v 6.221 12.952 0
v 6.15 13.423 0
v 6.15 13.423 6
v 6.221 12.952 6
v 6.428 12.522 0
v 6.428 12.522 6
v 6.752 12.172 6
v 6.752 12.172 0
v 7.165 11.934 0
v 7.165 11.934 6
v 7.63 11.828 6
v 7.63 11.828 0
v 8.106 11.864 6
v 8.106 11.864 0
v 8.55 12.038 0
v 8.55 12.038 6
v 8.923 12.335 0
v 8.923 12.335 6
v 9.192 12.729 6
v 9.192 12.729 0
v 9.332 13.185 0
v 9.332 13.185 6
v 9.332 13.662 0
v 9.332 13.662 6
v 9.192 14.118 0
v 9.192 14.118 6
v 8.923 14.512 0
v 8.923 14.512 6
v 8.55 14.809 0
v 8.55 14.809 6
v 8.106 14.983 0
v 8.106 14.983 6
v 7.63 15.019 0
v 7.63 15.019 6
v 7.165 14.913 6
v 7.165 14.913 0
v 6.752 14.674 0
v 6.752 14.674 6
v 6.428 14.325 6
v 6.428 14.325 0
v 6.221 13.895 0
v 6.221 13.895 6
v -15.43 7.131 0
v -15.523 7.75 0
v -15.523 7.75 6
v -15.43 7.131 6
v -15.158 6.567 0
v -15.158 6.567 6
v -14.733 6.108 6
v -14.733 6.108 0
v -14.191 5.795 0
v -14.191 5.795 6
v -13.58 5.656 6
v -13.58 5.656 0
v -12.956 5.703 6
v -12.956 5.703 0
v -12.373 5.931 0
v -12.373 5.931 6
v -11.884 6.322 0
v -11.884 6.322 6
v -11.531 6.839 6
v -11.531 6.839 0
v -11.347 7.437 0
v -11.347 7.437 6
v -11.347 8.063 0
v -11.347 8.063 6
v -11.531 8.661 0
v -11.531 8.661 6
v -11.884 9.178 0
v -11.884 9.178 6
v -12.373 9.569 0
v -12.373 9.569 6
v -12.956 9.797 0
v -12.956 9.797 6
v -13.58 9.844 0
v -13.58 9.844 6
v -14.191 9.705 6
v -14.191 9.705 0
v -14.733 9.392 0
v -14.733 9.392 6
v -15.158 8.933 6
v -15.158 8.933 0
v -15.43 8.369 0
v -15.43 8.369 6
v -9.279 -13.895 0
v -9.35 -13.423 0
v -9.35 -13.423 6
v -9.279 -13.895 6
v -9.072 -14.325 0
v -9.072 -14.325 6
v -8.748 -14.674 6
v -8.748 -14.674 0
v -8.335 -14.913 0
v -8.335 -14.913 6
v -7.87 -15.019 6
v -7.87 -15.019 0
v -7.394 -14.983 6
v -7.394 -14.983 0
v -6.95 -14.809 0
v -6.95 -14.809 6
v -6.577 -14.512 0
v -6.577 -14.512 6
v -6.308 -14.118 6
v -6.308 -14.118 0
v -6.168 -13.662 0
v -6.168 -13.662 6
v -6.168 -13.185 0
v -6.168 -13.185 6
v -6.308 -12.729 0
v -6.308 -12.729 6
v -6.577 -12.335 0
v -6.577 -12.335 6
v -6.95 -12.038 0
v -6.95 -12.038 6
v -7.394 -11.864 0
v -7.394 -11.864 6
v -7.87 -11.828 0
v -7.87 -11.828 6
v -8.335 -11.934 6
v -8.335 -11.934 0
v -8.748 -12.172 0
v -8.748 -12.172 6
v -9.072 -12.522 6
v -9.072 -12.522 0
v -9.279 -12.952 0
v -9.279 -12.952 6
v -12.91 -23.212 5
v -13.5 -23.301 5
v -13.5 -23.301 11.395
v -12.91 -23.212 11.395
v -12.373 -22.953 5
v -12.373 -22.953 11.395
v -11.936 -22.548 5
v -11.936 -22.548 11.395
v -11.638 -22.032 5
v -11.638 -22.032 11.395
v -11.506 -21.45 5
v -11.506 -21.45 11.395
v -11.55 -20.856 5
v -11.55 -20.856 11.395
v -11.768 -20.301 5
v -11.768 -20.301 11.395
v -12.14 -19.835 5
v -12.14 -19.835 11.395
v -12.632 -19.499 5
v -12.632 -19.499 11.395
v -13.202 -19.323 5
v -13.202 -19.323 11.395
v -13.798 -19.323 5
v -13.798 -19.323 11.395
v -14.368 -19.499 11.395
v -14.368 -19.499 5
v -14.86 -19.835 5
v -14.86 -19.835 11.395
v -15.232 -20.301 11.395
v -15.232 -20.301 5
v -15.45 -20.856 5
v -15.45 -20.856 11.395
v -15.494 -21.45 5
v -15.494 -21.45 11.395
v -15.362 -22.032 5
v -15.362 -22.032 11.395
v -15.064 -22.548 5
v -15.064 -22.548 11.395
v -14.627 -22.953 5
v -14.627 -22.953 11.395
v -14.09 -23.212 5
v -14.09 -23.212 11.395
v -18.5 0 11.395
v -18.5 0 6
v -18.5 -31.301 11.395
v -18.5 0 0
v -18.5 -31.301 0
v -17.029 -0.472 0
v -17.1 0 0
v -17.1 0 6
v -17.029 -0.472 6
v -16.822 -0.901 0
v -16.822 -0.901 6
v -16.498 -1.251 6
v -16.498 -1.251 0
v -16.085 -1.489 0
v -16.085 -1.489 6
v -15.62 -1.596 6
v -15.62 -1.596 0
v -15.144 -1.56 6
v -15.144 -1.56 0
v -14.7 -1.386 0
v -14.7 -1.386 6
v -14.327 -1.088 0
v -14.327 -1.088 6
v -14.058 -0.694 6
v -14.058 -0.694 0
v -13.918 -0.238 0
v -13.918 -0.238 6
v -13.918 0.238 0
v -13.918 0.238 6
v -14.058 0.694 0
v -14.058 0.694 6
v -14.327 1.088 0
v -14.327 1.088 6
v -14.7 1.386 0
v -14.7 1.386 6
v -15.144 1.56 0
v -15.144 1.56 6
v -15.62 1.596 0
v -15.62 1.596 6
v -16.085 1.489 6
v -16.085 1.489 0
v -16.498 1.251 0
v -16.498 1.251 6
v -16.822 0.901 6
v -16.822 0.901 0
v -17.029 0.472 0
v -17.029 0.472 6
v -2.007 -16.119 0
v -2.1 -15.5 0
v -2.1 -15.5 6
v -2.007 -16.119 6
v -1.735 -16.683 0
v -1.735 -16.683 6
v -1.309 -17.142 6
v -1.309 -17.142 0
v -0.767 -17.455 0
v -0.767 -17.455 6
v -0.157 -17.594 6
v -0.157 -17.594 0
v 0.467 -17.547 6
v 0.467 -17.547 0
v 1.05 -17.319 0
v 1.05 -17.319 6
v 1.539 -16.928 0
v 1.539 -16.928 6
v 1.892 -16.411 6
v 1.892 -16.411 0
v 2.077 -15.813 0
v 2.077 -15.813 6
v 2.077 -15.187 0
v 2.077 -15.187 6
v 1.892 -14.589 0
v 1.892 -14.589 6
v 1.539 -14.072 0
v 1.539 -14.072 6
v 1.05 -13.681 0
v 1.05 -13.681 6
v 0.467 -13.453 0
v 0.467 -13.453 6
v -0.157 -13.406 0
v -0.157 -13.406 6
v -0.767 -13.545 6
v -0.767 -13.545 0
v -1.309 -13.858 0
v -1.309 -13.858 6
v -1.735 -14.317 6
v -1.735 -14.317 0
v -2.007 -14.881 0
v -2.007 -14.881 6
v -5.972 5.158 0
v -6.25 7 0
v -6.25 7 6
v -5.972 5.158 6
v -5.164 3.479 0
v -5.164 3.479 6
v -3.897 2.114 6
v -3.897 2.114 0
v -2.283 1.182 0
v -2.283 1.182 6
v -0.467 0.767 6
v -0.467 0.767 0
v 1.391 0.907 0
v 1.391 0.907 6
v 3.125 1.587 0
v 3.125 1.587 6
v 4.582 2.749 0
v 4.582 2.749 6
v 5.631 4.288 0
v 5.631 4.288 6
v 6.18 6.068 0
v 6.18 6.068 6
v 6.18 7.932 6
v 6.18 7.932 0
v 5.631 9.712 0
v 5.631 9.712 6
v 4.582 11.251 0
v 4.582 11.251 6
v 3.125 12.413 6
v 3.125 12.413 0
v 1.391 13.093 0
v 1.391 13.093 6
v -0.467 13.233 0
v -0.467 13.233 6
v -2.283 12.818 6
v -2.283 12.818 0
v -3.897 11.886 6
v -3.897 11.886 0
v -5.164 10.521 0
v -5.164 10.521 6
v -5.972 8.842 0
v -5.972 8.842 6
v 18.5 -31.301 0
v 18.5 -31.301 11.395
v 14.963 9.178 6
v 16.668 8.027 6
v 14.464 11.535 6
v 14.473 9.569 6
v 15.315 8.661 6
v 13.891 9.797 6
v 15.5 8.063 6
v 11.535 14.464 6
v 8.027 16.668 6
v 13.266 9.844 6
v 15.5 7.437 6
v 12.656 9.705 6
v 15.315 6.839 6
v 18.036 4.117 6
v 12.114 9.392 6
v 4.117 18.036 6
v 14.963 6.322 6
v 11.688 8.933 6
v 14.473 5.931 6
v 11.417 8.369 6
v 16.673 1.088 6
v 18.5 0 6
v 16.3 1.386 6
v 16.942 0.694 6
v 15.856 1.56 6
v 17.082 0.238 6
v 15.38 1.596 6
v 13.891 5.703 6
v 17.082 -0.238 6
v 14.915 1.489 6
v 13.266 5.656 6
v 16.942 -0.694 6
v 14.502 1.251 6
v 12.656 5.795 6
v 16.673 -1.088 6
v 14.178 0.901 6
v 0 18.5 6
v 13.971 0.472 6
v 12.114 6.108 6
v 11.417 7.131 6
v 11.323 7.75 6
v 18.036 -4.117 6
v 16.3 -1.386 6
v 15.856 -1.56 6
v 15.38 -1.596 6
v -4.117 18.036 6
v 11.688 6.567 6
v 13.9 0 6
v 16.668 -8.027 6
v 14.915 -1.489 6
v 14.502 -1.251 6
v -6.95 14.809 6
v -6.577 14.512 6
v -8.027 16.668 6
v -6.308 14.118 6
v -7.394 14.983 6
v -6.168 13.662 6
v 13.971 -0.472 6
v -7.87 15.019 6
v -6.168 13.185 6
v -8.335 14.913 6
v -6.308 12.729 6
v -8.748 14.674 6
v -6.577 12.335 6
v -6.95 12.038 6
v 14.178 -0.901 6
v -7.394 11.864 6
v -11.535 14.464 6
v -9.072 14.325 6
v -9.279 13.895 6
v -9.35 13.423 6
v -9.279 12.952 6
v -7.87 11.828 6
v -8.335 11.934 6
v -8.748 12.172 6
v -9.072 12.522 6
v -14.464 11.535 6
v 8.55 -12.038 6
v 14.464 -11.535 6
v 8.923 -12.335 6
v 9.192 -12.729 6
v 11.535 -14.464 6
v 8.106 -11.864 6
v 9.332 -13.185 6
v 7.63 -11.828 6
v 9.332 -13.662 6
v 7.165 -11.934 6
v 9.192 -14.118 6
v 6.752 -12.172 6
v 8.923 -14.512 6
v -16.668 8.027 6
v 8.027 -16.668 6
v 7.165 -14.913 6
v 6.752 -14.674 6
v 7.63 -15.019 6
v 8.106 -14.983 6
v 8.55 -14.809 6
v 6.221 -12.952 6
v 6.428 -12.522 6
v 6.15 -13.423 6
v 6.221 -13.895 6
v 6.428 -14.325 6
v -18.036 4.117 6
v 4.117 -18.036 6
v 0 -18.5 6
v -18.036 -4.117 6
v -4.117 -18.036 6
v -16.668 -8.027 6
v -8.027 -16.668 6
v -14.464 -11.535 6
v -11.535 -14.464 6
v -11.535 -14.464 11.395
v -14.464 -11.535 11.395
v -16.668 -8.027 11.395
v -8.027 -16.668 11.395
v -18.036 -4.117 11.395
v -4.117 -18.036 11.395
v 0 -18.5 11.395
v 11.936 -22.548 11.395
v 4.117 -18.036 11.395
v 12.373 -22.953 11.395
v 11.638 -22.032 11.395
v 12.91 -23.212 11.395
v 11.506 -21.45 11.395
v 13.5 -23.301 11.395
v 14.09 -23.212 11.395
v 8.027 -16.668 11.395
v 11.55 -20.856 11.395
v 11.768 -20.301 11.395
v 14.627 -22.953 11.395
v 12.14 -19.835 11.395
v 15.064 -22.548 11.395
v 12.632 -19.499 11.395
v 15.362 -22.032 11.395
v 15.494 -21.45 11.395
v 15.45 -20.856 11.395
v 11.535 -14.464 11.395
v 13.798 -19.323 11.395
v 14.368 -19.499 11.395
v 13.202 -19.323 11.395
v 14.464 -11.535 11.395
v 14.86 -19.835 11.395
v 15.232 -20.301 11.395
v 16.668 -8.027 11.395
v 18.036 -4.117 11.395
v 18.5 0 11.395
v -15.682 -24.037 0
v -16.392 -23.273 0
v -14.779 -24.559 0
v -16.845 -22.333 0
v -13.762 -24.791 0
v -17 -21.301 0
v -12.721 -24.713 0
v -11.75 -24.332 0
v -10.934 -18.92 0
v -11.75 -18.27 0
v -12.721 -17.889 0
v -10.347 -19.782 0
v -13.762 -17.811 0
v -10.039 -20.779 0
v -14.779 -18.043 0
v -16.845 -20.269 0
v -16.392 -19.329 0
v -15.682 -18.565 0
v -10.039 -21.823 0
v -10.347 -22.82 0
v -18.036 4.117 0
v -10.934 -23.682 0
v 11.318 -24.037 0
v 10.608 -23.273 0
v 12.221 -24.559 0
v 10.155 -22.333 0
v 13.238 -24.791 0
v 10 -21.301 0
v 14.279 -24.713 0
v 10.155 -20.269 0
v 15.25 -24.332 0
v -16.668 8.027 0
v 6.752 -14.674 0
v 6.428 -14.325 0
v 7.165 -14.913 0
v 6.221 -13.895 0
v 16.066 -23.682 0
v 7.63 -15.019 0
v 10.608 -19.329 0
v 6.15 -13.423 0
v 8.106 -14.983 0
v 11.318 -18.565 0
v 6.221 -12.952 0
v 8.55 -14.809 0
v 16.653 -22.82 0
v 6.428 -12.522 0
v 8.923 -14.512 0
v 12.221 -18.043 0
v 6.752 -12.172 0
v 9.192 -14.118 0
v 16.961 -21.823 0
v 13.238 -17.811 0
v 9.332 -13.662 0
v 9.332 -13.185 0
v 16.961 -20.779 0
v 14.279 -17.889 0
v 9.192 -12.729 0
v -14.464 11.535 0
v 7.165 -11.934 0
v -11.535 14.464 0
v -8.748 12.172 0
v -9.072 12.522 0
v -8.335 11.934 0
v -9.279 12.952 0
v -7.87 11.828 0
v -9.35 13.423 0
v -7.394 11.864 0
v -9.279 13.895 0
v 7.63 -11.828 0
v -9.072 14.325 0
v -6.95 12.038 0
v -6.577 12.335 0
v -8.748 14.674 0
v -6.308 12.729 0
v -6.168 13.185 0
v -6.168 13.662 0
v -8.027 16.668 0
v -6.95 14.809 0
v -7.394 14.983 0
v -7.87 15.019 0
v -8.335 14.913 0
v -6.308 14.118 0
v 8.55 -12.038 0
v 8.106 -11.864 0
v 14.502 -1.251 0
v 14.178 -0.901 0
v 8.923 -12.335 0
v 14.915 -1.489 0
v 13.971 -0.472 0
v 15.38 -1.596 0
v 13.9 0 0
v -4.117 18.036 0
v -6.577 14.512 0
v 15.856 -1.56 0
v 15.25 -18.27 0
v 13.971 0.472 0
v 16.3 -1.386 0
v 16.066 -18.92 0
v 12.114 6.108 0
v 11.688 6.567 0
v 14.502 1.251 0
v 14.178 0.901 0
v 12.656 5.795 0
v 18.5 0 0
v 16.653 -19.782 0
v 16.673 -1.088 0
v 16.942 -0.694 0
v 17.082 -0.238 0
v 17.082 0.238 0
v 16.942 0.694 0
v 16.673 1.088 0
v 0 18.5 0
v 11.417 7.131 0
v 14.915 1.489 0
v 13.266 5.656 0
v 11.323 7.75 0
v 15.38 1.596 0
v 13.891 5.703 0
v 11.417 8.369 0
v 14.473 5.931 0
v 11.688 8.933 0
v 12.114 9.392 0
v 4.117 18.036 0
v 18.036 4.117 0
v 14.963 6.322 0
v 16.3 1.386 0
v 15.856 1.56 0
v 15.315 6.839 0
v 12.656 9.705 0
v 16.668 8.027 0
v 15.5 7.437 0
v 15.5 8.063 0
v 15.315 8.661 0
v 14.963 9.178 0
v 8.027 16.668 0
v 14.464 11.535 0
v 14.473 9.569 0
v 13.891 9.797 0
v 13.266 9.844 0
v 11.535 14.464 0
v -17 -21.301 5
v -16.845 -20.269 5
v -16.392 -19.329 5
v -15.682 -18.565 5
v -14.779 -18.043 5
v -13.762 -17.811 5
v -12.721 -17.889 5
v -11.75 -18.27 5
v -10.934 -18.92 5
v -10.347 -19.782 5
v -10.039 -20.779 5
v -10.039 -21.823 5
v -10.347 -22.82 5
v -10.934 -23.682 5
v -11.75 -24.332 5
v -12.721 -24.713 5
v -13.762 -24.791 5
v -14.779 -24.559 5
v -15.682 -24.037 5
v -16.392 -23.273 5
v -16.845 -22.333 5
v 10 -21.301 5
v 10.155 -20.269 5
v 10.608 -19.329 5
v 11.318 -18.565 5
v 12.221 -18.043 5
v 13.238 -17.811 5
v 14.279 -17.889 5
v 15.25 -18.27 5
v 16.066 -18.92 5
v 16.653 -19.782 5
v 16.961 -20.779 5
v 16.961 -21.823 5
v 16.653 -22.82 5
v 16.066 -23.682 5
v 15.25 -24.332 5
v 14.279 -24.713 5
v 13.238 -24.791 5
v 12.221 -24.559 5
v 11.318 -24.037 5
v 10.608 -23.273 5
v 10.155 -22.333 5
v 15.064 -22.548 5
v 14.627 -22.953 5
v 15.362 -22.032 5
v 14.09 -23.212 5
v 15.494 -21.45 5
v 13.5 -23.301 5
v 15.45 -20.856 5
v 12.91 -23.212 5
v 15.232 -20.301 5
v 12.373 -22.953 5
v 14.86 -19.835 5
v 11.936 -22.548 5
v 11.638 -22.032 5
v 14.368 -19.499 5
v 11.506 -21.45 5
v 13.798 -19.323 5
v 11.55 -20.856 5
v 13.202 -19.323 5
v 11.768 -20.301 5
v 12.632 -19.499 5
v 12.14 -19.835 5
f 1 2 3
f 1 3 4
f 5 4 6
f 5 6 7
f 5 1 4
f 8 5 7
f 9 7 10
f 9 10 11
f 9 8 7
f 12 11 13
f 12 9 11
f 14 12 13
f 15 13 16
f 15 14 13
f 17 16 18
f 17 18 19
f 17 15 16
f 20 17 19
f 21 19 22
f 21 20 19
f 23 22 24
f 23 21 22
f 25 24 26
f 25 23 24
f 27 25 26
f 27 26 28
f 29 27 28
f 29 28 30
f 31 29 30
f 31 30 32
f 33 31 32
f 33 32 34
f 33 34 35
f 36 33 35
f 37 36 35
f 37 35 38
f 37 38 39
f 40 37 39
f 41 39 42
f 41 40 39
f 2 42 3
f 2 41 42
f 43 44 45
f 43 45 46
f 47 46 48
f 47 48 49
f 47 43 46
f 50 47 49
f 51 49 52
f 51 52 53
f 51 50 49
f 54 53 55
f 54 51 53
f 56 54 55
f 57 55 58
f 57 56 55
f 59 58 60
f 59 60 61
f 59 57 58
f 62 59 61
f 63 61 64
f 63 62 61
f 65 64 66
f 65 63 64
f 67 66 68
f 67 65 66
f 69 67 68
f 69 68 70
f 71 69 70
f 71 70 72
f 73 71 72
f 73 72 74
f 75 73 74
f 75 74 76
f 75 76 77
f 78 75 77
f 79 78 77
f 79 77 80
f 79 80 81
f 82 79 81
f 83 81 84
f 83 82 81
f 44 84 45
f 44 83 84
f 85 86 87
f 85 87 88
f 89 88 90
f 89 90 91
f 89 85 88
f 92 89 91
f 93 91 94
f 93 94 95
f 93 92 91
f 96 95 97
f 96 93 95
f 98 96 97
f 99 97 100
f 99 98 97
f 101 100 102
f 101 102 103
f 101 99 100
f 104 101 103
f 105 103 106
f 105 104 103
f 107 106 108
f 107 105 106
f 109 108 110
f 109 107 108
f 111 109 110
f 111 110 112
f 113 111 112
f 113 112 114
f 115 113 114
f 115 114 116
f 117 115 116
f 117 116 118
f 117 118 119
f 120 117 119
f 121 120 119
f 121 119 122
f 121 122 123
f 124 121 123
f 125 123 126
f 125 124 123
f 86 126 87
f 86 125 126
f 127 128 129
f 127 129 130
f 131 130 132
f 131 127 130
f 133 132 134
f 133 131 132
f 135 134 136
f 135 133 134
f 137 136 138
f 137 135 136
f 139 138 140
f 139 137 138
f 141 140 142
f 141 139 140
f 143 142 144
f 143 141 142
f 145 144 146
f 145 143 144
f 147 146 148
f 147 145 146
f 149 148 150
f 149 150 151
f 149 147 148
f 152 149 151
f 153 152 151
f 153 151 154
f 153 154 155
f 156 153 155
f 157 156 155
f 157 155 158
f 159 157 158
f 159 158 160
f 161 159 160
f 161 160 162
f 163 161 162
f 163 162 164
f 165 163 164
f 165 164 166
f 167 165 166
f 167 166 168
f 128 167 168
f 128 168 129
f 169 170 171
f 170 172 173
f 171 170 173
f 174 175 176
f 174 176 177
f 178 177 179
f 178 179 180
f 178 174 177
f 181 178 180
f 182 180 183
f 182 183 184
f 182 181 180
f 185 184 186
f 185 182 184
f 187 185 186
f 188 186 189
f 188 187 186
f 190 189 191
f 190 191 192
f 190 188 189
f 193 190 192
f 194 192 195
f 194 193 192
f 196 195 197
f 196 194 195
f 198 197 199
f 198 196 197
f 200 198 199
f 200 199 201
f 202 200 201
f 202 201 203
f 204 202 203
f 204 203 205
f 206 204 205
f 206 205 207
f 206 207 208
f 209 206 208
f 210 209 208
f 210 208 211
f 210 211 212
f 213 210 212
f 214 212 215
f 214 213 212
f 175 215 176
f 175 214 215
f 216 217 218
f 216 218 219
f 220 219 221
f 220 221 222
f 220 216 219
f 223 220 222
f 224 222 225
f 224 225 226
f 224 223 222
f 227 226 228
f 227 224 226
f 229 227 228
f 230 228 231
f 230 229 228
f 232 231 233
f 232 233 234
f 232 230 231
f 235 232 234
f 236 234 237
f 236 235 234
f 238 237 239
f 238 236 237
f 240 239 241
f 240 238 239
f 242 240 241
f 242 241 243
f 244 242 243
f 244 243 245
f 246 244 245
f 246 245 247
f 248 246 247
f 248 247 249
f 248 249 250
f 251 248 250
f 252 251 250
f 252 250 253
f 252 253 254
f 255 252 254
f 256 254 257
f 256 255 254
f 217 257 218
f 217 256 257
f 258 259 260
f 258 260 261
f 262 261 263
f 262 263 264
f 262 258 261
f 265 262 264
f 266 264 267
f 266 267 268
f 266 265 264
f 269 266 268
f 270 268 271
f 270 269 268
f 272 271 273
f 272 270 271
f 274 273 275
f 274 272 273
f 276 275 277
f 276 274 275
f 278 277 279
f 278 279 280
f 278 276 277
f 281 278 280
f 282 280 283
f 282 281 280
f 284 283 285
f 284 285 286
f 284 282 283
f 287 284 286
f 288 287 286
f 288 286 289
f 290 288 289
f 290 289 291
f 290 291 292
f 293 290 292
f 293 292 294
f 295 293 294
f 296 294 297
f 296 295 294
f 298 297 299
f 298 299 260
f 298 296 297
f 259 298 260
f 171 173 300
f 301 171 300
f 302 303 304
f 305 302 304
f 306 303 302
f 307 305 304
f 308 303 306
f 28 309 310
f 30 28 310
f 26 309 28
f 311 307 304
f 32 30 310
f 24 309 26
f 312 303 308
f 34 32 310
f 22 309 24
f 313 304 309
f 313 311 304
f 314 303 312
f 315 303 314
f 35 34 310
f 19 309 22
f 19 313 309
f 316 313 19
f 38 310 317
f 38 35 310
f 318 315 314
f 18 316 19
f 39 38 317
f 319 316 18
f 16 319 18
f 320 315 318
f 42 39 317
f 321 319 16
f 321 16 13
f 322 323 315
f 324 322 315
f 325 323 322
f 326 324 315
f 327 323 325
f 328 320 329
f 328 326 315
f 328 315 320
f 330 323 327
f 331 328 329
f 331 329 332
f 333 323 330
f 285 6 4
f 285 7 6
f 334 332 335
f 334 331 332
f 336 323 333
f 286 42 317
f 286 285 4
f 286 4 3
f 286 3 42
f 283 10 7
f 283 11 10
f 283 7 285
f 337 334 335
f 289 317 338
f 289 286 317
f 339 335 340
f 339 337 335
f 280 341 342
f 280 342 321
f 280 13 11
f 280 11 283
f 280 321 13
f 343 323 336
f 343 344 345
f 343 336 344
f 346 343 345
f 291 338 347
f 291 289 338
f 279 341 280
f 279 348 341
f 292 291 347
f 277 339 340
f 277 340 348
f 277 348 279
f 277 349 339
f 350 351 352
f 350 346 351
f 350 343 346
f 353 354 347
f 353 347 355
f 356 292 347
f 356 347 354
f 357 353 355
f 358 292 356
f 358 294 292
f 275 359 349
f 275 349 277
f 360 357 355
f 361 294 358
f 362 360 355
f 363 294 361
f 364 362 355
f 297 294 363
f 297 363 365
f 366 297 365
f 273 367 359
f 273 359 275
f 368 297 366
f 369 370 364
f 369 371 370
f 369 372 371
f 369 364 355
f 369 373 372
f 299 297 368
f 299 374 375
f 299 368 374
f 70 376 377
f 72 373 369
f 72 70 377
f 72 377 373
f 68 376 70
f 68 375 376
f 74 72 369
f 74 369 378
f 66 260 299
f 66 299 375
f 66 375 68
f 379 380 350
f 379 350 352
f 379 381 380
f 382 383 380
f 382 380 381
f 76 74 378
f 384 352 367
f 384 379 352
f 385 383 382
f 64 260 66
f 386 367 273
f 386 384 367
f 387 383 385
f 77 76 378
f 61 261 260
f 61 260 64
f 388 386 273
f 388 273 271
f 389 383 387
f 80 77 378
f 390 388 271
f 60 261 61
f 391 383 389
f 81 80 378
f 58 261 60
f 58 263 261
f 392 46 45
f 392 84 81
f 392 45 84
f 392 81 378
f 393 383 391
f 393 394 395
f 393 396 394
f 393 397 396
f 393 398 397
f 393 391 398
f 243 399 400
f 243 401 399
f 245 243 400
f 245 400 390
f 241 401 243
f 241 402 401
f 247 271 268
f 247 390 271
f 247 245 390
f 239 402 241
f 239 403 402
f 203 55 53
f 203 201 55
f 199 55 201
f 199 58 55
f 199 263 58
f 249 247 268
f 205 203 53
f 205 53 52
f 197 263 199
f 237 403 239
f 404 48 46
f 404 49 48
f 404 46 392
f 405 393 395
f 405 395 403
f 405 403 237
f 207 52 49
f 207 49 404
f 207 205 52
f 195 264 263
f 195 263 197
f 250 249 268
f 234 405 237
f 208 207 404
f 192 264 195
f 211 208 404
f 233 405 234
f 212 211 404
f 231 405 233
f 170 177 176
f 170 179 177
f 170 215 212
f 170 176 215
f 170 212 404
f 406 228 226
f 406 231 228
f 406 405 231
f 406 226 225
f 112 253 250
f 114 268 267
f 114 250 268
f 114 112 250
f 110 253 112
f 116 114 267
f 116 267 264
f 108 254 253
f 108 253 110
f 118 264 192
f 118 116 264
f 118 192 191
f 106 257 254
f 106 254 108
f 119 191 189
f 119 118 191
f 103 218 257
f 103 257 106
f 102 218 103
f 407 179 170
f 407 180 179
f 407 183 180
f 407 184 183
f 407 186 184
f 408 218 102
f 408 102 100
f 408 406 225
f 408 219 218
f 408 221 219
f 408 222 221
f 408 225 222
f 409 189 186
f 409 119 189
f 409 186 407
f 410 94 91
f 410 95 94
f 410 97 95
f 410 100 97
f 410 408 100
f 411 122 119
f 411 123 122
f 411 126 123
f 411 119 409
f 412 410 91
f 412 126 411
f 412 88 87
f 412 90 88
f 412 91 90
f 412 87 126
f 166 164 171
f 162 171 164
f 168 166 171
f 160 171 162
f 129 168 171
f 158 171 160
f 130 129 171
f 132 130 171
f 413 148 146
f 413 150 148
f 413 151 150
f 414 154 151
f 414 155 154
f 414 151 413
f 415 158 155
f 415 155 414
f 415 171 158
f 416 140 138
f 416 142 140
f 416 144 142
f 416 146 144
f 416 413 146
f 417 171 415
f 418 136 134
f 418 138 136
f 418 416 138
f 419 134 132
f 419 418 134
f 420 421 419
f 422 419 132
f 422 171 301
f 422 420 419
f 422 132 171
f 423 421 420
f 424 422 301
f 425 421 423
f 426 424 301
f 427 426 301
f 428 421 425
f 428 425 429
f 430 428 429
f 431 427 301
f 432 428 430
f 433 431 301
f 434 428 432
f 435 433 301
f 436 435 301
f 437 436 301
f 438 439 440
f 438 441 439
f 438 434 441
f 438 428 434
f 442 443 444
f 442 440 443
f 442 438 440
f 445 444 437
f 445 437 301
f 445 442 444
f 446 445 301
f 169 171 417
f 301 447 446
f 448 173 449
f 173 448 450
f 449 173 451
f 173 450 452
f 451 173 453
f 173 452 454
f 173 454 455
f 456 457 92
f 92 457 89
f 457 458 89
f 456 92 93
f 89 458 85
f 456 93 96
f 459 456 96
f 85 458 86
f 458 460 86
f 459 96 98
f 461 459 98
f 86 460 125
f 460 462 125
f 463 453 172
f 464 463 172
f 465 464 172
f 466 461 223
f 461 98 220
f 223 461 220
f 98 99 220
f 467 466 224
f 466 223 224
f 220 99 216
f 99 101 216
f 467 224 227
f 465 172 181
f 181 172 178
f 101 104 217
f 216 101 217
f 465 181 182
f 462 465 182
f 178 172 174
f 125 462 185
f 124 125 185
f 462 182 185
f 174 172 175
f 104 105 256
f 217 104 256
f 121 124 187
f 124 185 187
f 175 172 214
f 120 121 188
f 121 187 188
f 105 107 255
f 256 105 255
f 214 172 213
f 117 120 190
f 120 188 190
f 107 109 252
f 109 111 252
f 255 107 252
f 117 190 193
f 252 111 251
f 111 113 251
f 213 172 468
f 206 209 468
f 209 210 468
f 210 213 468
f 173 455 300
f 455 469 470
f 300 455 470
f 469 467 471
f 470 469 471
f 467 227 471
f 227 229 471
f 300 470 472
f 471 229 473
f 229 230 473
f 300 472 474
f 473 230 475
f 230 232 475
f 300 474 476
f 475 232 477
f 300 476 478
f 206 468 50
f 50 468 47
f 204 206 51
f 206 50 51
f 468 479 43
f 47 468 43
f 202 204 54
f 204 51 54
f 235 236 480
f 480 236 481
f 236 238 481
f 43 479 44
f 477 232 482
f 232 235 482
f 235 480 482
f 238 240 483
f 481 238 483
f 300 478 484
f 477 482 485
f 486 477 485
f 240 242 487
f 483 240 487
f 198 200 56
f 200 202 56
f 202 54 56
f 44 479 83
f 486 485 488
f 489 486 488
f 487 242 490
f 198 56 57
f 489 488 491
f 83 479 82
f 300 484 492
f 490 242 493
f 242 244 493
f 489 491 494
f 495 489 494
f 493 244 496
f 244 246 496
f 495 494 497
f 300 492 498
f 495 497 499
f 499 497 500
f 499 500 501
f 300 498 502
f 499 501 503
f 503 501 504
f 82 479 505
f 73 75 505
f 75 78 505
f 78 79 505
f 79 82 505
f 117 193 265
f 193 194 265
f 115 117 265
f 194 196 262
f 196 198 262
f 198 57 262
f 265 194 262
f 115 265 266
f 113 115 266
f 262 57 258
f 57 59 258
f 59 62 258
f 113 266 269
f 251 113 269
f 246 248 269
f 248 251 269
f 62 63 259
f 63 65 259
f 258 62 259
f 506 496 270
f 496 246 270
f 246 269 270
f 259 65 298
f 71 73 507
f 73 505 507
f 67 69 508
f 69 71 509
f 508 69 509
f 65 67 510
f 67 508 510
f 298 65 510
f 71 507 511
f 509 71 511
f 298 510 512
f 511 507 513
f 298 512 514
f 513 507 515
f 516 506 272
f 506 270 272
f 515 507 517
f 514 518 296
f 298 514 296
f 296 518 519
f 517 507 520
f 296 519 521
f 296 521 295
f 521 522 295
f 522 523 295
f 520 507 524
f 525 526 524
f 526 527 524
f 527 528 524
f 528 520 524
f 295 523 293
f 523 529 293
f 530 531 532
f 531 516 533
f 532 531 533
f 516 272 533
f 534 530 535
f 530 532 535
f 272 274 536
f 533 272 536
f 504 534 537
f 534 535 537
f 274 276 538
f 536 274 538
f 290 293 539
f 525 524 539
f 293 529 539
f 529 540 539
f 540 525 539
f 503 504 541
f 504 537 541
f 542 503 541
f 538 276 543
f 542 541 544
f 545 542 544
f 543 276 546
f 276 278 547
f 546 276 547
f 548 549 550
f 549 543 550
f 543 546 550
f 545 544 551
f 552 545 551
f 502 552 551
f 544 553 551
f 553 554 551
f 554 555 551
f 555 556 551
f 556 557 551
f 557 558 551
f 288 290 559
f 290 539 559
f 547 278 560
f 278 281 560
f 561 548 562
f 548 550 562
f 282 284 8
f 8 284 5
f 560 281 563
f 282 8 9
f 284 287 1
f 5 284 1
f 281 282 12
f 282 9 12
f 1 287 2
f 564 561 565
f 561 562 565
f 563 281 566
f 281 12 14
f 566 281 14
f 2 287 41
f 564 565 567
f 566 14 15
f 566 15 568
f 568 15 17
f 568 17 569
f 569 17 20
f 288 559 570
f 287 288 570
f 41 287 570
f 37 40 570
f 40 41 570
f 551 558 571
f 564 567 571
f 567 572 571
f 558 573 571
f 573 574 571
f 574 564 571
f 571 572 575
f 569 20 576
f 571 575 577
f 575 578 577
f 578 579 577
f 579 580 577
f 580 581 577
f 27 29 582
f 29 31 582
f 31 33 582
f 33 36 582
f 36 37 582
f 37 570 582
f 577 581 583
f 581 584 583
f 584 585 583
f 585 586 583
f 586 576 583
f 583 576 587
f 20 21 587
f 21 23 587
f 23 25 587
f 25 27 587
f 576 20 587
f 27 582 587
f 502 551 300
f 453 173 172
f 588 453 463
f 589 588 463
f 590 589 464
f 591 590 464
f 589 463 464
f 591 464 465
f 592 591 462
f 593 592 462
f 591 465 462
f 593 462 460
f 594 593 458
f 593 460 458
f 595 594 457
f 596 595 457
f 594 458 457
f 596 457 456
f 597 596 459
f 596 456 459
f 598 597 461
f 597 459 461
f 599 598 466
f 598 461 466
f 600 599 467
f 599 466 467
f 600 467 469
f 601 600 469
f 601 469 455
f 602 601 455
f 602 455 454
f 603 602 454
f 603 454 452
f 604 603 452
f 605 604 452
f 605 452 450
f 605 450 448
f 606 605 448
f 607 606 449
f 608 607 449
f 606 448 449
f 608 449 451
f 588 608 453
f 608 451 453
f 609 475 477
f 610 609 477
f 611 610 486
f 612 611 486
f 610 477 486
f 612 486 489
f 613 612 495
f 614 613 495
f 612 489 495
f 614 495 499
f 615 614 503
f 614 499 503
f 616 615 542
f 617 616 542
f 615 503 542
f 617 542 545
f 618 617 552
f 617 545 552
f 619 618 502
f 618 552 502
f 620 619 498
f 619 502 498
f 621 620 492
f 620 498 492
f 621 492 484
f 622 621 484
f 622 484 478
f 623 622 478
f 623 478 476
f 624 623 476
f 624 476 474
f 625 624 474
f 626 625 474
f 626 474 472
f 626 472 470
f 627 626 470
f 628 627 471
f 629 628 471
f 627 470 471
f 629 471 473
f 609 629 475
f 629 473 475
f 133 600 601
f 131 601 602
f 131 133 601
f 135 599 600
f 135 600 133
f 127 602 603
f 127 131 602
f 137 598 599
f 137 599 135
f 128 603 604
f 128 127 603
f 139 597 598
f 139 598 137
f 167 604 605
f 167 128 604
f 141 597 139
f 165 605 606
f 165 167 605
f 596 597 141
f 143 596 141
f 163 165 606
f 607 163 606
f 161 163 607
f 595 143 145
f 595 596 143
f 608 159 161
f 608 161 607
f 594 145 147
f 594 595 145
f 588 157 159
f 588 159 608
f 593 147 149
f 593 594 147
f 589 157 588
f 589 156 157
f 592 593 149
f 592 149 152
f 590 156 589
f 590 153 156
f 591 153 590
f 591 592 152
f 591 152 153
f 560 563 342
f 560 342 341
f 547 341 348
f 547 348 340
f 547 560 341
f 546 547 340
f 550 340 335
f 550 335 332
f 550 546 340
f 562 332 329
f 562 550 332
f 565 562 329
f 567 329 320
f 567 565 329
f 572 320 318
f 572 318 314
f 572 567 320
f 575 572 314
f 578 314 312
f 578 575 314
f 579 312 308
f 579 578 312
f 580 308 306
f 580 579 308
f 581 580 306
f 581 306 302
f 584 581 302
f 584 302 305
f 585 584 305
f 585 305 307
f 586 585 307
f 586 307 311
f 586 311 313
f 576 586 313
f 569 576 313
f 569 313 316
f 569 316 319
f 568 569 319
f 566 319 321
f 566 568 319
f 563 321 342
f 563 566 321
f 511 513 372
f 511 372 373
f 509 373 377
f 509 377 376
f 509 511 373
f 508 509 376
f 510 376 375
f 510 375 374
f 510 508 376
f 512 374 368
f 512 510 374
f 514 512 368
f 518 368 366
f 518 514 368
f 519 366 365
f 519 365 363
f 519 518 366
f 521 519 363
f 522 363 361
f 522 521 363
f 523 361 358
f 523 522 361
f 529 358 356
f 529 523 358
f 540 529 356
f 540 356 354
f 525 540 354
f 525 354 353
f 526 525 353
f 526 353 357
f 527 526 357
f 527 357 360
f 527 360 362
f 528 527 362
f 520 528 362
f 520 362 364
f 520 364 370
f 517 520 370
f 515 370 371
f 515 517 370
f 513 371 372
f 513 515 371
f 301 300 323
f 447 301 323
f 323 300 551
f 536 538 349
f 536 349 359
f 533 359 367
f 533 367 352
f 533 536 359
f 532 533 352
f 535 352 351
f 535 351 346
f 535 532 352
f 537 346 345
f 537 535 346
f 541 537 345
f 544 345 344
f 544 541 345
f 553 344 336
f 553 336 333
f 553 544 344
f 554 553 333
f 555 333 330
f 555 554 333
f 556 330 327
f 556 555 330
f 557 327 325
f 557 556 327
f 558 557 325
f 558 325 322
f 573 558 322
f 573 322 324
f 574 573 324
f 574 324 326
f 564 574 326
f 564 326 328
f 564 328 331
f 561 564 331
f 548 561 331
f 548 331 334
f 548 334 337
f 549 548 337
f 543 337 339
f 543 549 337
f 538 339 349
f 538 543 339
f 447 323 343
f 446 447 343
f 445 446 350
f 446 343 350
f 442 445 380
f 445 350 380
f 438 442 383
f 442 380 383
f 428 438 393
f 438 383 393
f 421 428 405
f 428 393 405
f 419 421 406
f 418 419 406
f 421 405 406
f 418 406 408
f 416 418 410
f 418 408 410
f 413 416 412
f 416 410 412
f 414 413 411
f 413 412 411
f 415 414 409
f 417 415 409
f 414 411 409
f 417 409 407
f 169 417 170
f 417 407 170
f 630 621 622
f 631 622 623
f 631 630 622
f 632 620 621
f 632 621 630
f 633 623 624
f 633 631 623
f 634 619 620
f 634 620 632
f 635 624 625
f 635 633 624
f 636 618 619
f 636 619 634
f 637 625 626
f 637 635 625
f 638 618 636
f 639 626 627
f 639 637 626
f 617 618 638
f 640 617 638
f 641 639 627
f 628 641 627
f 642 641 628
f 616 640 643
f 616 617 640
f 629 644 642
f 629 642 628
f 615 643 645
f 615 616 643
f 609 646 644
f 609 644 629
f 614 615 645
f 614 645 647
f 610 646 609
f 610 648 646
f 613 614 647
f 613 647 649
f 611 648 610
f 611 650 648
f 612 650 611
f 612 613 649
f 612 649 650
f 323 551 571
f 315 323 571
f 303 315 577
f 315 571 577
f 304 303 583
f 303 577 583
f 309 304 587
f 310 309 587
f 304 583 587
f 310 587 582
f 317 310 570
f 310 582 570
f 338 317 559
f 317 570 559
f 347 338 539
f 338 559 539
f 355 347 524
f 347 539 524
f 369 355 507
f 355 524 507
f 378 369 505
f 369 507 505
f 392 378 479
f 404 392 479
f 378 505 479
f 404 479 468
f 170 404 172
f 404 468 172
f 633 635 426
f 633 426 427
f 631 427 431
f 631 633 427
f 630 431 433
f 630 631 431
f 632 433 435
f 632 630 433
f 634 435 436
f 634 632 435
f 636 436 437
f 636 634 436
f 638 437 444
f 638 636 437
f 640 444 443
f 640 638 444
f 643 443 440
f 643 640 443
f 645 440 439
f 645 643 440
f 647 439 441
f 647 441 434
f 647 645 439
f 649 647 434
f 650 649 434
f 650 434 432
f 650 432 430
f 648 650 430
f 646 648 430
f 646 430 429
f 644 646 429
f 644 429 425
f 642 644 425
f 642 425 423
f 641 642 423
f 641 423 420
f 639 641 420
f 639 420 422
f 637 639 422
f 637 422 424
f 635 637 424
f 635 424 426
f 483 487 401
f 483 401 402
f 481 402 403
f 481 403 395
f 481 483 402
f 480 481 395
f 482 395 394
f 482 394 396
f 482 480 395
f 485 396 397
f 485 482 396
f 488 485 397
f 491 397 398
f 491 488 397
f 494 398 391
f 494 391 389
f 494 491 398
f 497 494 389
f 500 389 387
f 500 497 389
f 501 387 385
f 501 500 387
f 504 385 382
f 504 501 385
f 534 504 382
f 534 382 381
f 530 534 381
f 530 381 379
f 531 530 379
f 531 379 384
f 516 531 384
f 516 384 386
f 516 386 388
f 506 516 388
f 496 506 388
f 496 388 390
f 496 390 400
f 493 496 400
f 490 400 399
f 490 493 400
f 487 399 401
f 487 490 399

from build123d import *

# Parameters (mm, degrees)
SKETCH1_R           = 18.5
SKETCH1_R_2         = 6.25
SKETCH1_R_3         = 1.6
SKETCH1_R_4         = 2.1
BOSS_EXTRUDE1_DEPTH = 6
BOSS_EXTRUDE2_START = -6
SKETCH3_R           = 2
BOSS_EXTRUDE2_DEPTH = 11.395208
SKETCH4_R           = 3.5
CUT_EXTRUDE1_DEPTH  = 5


with BuildPart() as part:
    # Sketch1 → Boss-Extrude1 (new body)
    with BuildSketch(Plane.XY):
        with Locations(Location((0, 0, 0), (0, 0, 180))):
            Circle(SKETCH1_R)
        with Locations(Location((0, 7, 0), (0, 0, 180))):
            Circle(SKETCH1_R_2, mode=Mode.SUBTRACT)
        with Locations(Location((15.5, 0, 0), (0, 0, 180))):
            Circle(SKETCH1_R_3, mode=Mode.SUBTRACT)
        with Locations(Location((7.75, -13.423393759, 0), (0, 0, 180))):
            Circle(SKETCH1_R_3, mode=Mode.SUBTRACT)
        with Locations(Location((-7.75, -13.423393759, 0), (0, 0, 180))):
            Circle(SKETCH1_R_3, mode=Mode.SUBTRACT)
        with Locations(Location((-15.5, 0, 0), (0, 0, 180))):
            Circle(SKETCH1_R_3, mode=Mode.SUBTRACT)
        with Locations(Location((-7.75, 13.423393759, 0), (0, 0, 180))):
            Circle(SKETCH1_R_3, mode=Mode.SUBTRACT)
        with Locations(Location((7.75, 13.423393759, 0), (0, 0, 180))):
            Circle(SKETCH1_R_3, mode=Mode.SUBTRACT)
        with Locations(Location((13.423393759, 7.75, 0), (0, 0, 180))):
            Circle(SKETCH1_R_4, mode=Mode.SUBTRACT)
        with Locations(Location((0, -15.5, 0), (0, 0, 180))):
            Circle(SKETCH1_R_4, mode=Mode.SUBTRACT)
        with Locations(Location((-13.423393759, 7.75, 0), (0, 0, 180))):
            Circle(SKETCH1_R_4, mode=Mode.SUBTRACT)
    extrude(amount=BOSS_EXTRUDE1_DEPTH)

    # Sketch3 → Boss-Extrude2 (add)
    with BuildSketch(Plane.XY.offset(6).offset(BOSS_EXTRUDE2_START)):
        with BuildLine():
            ThreePointArc((18.5, 0), (0, -18.5), (-18.5, 0))
            Line((-18.5, 0), (-18.5, -31.300991))
            Line((-18.5, -31.300991), (18.5, -31.300991))
            Line((18.5, -31.300991), (18.5, 0))
        make_face()
        with Locations(Location((-13.5, -21.300991, 0), (0, 0, 270))):
            Circle(SKETCH3_R, mode=Mode.SUBTRACT)
        with Locations(Location((13.5, -21.300991, 0), (0, 0, 270))):
            Circle(SKETCH3_R, mode=Mode.SUBTRACT)
    extrude(amount=BOSS_EXTRUDE2_DEPTH)

    # Sketch4 → Cut-Extrude1 (cut)
    with BuildSketch(Plane(origin=(0, 0, 0), x_dir=(-1, 0, 0), z_dir=(0, 0, -1))):
        with Locations((-13.5, -21.300991)):
            Circle(SKETCH4_R)
        with Locations((13.5, -21.300991)):
            Circle(SKETCH4_R)
    extrude(amount=-CUT_EXTRUDE1_DEPTH, mode=Mode.SUBTRACT)


solid = part.part
